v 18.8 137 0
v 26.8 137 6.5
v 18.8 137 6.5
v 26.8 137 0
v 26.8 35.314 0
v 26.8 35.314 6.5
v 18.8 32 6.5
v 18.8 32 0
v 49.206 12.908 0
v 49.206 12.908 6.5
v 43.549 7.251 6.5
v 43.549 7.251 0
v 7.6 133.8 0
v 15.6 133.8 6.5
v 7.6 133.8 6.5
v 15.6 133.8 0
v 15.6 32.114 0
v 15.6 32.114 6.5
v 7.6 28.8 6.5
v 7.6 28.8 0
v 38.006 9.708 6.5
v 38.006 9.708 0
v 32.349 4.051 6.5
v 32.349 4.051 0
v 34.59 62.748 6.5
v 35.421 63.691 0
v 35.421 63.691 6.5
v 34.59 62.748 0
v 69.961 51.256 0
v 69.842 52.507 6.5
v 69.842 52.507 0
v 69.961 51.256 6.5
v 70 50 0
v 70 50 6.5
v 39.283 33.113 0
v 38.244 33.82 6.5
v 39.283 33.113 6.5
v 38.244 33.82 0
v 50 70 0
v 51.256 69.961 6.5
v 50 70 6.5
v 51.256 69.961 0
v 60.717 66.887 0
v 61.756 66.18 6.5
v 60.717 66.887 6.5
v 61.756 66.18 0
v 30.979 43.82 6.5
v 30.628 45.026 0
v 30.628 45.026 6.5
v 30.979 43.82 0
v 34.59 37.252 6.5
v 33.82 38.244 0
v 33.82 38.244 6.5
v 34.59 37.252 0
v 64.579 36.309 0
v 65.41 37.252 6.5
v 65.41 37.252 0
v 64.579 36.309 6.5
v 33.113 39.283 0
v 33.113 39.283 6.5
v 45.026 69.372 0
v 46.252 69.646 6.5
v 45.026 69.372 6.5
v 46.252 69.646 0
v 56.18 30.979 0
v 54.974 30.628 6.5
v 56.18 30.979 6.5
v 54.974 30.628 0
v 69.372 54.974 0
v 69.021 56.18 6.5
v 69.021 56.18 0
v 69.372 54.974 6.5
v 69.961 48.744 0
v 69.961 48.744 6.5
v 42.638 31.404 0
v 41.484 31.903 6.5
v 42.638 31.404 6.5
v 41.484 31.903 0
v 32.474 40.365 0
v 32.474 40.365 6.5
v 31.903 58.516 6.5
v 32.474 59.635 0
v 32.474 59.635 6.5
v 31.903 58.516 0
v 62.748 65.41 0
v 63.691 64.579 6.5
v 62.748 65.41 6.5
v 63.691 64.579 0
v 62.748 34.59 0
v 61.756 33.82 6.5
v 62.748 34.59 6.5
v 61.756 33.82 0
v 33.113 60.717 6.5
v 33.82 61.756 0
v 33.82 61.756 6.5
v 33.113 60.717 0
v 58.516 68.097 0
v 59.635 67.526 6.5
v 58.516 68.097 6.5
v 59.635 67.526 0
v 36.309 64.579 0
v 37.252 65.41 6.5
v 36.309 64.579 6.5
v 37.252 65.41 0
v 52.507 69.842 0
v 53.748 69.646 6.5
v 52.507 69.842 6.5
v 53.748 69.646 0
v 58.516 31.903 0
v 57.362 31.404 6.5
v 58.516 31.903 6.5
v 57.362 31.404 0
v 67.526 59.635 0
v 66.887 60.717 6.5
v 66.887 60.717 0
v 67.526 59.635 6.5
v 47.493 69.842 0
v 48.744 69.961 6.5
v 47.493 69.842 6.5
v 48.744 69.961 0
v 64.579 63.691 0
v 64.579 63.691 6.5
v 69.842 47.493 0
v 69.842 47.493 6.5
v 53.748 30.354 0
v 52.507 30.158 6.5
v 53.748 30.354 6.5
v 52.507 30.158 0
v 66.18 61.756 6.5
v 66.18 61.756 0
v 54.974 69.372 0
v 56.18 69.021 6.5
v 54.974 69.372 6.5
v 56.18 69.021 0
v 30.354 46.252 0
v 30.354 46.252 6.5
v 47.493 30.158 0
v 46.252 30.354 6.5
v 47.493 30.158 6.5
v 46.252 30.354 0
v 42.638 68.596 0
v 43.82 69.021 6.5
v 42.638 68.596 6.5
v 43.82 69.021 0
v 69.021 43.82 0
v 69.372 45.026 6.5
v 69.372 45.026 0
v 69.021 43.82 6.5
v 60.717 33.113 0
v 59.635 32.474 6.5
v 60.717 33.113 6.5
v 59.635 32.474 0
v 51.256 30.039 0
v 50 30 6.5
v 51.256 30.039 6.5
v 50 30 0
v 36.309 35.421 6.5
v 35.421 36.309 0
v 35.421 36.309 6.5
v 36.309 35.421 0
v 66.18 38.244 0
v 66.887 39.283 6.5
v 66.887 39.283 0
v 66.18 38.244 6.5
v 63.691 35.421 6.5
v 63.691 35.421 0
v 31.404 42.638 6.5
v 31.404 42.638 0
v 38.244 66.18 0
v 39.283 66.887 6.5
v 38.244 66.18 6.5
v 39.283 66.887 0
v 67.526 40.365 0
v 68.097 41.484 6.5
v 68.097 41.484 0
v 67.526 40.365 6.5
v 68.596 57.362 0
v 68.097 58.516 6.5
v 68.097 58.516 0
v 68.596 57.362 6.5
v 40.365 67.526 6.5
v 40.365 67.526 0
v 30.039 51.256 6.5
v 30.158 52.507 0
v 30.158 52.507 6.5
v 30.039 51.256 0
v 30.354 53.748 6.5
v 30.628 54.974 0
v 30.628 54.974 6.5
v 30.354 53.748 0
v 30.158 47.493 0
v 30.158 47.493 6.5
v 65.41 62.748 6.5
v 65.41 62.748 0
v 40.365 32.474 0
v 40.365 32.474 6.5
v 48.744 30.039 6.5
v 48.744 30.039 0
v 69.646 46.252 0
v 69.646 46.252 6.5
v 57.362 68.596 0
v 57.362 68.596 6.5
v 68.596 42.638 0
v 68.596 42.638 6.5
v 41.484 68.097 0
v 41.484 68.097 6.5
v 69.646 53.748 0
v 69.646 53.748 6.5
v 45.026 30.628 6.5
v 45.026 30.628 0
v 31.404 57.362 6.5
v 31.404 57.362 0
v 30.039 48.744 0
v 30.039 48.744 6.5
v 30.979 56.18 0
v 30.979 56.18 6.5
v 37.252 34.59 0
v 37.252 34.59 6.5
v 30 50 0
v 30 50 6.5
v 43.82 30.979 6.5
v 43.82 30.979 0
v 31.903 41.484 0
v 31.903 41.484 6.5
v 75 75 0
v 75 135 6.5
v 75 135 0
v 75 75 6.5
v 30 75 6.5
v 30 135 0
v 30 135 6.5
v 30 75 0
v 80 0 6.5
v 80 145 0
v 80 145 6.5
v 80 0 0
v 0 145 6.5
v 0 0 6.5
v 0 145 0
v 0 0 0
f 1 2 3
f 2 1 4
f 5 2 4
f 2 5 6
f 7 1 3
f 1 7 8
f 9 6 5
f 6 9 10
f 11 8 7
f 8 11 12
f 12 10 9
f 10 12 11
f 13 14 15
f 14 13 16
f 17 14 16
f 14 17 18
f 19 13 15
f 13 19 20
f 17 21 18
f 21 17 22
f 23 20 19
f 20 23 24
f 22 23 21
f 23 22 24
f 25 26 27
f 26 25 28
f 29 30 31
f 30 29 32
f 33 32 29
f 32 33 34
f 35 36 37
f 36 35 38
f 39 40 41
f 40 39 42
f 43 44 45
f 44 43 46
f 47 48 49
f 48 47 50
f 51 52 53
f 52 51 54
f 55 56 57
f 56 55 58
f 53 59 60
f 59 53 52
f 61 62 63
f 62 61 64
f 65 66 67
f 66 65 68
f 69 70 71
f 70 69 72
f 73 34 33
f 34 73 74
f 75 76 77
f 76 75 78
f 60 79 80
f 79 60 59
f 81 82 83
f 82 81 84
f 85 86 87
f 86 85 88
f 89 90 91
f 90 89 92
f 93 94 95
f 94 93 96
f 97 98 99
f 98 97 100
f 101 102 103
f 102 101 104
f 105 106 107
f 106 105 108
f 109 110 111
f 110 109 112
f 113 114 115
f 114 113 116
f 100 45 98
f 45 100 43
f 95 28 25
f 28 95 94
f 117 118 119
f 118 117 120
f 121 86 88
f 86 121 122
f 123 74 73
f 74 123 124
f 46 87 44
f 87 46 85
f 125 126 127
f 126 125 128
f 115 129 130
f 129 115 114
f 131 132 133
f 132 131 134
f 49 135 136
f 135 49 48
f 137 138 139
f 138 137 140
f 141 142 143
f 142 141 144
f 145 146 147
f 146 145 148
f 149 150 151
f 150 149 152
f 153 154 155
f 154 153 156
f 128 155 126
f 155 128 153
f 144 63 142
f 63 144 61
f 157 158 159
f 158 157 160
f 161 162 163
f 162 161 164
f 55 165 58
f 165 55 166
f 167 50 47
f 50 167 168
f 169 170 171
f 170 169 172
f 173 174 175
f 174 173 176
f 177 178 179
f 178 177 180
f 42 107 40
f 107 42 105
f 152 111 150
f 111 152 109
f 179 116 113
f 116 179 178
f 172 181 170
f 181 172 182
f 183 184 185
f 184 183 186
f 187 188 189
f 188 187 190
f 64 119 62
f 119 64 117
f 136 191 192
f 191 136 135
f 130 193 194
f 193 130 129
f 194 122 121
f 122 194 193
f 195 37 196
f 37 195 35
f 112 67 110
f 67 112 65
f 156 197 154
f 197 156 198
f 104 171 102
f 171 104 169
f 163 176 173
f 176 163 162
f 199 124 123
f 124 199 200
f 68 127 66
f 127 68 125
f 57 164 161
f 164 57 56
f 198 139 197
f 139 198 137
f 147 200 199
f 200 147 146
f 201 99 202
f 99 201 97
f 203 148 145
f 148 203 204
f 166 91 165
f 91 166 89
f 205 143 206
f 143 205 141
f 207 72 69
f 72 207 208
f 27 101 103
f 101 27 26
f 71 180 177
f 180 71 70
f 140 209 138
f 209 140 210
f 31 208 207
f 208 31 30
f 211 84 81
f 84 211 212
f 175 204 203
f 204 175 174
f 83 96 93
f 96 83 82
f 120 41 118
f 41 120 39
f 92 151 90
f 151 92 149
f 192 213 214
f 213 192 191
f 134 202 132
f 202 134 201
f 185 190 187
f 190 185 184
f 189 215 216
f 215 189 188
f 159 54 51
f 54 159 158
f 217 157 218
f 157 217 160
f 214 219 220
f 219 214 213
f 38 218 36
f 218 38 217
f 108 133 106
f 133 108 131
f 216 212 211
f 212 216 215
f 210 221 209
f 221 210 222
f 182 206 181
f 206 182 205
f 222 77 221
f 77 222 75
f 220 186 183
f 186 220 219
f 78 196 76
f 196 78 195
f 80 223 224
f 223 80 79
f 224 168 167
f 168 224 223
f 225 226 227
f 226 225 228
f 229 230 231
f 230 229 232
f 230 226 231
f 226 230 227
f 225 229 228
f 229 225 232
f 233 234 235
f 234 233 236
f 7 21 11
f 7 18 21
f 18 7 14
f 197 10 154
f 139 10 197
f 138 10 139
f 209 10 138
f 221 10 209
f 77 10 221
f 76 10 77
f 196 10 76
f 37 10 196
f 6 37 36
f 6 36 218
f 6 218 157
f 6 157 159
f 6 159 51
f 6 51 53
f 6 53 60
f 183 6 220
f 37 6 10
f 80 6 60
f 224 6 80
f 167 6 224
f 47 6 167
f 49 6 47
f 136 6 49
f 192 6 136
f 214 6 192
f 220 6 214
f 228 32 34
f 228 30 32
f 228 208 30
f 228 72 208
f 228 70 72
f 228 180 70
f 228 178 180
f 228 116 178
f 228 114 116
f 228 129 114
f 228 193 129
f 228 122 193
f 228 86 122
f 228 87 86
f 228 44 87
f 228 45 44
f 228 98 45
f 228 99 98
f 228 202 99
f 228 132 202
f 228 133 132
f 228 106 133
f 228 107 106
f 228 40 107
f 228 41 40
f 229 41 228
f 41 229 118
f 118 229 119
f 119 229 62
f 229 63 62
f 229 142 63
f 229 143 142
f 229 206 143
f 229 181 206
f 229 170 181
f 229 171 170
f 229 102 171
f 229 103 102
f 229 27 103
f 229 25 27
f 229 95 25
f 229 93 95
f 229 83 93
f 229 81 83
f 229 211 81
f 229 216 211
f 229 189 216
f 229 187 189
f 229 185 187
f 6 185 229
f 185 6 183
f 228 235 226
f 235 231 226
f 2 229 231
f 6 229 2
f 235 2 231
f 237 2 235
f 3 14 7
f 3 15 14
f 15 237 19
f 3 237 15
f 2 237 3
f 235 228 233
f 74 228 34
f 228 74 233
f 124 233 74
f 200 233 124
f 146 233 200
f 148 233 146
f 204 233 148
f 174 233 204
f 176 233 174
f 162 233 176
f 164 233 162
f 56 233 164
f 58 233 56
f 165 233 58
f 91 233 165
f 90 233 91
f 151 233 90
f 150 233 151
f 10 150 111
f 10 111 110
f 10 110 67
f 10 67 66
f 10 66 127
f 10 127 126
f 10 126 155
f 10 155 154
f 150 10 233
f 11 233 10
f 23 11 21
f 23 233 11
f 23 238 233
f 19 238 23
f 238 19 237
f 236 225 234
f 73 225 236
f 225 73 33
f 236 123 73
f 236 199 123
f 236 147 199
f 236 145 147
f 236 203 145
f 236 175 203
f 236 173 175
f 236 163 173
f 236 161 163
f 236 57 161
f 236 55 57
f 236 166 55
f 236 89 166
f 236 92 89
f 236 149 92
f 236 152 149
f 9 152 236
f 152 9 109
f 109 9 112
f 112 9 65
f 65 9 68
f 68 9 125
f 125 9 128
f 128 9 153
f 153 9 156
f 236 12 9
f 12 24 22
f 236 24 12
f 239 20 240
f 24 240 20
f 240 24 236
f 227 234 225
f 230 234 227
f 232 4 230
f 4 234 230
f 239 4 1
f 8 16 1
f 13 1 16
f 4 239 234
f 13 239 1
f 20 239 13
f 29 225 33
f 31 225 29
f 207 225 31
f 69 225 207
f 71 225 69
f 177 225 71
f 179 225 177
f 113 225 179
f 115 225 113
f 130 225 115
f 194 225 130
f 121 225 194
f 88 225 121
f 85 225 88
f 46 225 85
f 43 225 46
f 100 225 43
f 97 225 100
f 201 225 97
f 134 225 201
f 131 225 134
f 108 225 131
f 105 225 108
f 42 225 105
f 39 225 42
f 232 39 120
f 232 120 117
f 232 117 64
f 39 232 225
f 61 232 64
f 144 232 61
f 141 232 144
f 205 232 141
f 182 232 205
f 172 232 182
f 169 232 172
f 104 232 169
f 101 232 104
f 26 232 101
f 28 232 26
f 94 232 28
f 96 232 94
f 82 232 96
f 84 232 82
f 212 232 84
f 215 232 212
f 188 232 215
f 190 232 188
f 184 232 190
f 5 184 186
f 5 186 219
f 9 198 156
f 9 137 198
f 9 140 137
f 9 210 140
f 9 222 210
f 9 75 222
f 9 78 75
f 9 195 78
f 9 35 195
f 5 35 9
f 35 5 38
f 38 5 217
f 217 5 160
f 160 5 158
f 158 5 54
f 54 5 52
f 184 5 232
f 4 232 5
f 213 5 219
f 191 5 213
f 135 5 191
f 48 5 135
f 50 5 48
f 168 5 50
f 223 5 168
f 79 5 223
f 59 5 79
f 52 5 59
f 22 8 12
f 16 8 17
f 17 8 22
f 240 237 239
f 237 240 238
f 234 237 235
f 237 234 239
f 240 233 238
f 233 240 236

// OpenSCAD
espatula_cmp_1 = 105;
espatula_cmp_2 = 35;
espatula_lar = 8;
espatula_alt = 13;
espatula_ang = 45;

chave_raio_od = 40;
chave_raio_id = 32;
chave_raio_alt = 13;

hex1_cmp_1 = 82;
hex1_cmp_2 = 32;
hex1_lar = 5.5;
hex1_alt = 5.5;
hex1_ang= 90;

obj_dist = 3.2;

gancheira_cmp = 60;
gancheira_lar = 45;
gancheira_alt = 9;

toolbox_width = 80;
toolbox_height = 145;
toolbox_length = max( chave_raio_alt, espatula_alt, gancheira_alt );

module chave( cmp_1, cmp_2, ang, lar, alt )
{
	cube( [ cmp_1, lar, alt ] );
	translate( [ cmp_1, 0, 0 ] )
		rotate( ang, [ 0, 0, 1 ] )
			cube( [ cmp_2, lar, alt ] );
}

module holes(){
	translate( [ 0, 0, -0.1 ] )
	{
		// Chave de raio:
		cylinder( h = chave_raio_alt + 0.1, r = chave_raio_od / 2, $fn = 100 );

		// Gancheira:
		translate( [ -chave_raio_od / 2, chave_raio_od / 2 + 5, 0 ] )
			cube( [ gancheira_lar, gancheira_cmp, gancheira_alt + 0.1  ] );

		// Espátulas:
		translate( [ -chave_raio_od / 2 - obj_dist - espatula_lar, espatula_cmp_1 - 18, 0 ] )
		rotate( -90, [ 0, 0, 1 ] )
			chave( cmp_1 = espatula_cmp_1, cmp_2 = espatula_cmp_2, ang = espatula_ang, lar = espatula_lar, alt = espatula_alt + 0.1 );
		translate( [ -chave_raio_od / 2 - 2 * obj_dist - 2 * espatula_lar, espatula_cmp_1 - 18 - obj_dist, 0 ] )
		rotate( -90, [ 0, 0, 1 ] )
			chave( cmp_1 = espatula_cmp_1, cmp_2 = espatula_cmp_2, ang = espatula_ang, lar = espatula_lar, alt = espatula_alt + 0.1 );
	}
}

difference(){
	cube( [ toolbox_width, toolbox_height, toolbox_length / 2 ] );
	translate( [ 70 - chave_raio_od / 2, 70 - chave_raio_od / 2, 0 ] )
		#holes();
}
